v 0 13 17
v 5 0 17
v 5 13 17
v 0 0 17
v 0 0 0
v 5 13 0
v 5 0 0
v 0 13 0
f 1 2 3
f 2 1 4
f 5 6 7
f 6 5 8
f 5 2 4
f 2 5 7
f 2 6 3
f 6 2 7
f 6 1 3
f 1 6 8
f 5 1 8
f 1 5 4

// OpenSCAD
// Generated by SolidPython 1.0.1 on 2020-07-29 00:39:26


cube(size = [5, 13, 17]);
/***********************************************
*********      SolidPython code:      **********
************************************************
 
# import packages: SolidPython
from solid import *
from solid.utils import *
from itertools import chain, combinations


class Resize:

    def __init__(self, scad_file):
        self.scad_file = scad_file
        #self.scad_file = import_scad(scad_file)
        # cone/cylinder param:
        self.r1 = 0
        self.r2 = 0
        self.h = 0
        # rectangular prism param:
        self.w = 0
        self.l = 0
        # ellipse param:
        self.r = 0

    # import OpenScad code (file name corresponds to shape)


    # classify shape + parameters
    def assign(self, param1, param2, param3):
        if self.scad_file == 'cone.scad':
            self.r1 = param1
            self.r2 = param2
            self.h = param3
        elif self.scad_file == 'cylinder.scad':
            self.r1 = param1
            self.r2 = param2
            self.h = param3
        elif self.scad_file == 'rectangularPrism.scad':
            self.h = param1
            self.l = param2
            self.w = param3
        else:
            self.r = param1
            self.h = param2

    # resize parameters
    def iterate(self):
        x = range(3, 20, 2)
        i = 1
        if self.scad_file == 'cone.scad':
            tempList = list(combinations(x, 2))
            for temp in tempList:
                param1 = temp[0]
                param2 = temp[1]
                filepath = 'produced_scad_files/' + 'cone' + str(param1) + '_' + str(param2) + '_' + '.scad'
                scad_render_to_file(cylinder(h=param1, r1=param2, r2=0), filepath)

        elif self.scad_file == 'cylinder.scad':
            tempList = list(combinations(x, 3))
            for temp in tempList:
                param1 = temp[0]
                param2 = temp[1]
                filepath = 'produced_scad_files/' + 'cylinder' + str(param1) + '_' + str(param2) + '_' + '.scad'
                scad_render_to_file(cylinder(h=param1, r1=param2, r2=param2), filepath)

        elif self.scad_file == 'rectangularPrism.scad':
            tempList = list(combinations(x, 3))
            for temp in tempList:
                param1 = temp[0]
                param2 = temp[1]
                param3 = temp[2]
                filepath = 'produced_scad_files/' + 'rectangularPrism' + str(param1) + '_' + str(param2) + '_' + str(
                    param3) + '.scad'
                scad_render_to_file(cube(size=(param1, param2, param3)), filepath)

        elif self.scad_file == 'ellipse.scad':
            tempList = list(combinations(x, 4))
            for temp in tempList:
                param1 = temp[0]
                param2 = temp[1]
                param3 = temp[2]
                param4 = temp[3]
                filepath = 'produced_scad_files/' + 'ellipse' + str(param1) + '_' + str(param2) + '_' + str(param3) + '_' + str(param4) + '.scad'
                scad_render_to_file(scale([param1, param2, param3])(sphere(r=param4)), filepath)

    def render_to_scadfile(self):
        scad_render_to_file(scad, 'example.scad') 
 
************************************************/
